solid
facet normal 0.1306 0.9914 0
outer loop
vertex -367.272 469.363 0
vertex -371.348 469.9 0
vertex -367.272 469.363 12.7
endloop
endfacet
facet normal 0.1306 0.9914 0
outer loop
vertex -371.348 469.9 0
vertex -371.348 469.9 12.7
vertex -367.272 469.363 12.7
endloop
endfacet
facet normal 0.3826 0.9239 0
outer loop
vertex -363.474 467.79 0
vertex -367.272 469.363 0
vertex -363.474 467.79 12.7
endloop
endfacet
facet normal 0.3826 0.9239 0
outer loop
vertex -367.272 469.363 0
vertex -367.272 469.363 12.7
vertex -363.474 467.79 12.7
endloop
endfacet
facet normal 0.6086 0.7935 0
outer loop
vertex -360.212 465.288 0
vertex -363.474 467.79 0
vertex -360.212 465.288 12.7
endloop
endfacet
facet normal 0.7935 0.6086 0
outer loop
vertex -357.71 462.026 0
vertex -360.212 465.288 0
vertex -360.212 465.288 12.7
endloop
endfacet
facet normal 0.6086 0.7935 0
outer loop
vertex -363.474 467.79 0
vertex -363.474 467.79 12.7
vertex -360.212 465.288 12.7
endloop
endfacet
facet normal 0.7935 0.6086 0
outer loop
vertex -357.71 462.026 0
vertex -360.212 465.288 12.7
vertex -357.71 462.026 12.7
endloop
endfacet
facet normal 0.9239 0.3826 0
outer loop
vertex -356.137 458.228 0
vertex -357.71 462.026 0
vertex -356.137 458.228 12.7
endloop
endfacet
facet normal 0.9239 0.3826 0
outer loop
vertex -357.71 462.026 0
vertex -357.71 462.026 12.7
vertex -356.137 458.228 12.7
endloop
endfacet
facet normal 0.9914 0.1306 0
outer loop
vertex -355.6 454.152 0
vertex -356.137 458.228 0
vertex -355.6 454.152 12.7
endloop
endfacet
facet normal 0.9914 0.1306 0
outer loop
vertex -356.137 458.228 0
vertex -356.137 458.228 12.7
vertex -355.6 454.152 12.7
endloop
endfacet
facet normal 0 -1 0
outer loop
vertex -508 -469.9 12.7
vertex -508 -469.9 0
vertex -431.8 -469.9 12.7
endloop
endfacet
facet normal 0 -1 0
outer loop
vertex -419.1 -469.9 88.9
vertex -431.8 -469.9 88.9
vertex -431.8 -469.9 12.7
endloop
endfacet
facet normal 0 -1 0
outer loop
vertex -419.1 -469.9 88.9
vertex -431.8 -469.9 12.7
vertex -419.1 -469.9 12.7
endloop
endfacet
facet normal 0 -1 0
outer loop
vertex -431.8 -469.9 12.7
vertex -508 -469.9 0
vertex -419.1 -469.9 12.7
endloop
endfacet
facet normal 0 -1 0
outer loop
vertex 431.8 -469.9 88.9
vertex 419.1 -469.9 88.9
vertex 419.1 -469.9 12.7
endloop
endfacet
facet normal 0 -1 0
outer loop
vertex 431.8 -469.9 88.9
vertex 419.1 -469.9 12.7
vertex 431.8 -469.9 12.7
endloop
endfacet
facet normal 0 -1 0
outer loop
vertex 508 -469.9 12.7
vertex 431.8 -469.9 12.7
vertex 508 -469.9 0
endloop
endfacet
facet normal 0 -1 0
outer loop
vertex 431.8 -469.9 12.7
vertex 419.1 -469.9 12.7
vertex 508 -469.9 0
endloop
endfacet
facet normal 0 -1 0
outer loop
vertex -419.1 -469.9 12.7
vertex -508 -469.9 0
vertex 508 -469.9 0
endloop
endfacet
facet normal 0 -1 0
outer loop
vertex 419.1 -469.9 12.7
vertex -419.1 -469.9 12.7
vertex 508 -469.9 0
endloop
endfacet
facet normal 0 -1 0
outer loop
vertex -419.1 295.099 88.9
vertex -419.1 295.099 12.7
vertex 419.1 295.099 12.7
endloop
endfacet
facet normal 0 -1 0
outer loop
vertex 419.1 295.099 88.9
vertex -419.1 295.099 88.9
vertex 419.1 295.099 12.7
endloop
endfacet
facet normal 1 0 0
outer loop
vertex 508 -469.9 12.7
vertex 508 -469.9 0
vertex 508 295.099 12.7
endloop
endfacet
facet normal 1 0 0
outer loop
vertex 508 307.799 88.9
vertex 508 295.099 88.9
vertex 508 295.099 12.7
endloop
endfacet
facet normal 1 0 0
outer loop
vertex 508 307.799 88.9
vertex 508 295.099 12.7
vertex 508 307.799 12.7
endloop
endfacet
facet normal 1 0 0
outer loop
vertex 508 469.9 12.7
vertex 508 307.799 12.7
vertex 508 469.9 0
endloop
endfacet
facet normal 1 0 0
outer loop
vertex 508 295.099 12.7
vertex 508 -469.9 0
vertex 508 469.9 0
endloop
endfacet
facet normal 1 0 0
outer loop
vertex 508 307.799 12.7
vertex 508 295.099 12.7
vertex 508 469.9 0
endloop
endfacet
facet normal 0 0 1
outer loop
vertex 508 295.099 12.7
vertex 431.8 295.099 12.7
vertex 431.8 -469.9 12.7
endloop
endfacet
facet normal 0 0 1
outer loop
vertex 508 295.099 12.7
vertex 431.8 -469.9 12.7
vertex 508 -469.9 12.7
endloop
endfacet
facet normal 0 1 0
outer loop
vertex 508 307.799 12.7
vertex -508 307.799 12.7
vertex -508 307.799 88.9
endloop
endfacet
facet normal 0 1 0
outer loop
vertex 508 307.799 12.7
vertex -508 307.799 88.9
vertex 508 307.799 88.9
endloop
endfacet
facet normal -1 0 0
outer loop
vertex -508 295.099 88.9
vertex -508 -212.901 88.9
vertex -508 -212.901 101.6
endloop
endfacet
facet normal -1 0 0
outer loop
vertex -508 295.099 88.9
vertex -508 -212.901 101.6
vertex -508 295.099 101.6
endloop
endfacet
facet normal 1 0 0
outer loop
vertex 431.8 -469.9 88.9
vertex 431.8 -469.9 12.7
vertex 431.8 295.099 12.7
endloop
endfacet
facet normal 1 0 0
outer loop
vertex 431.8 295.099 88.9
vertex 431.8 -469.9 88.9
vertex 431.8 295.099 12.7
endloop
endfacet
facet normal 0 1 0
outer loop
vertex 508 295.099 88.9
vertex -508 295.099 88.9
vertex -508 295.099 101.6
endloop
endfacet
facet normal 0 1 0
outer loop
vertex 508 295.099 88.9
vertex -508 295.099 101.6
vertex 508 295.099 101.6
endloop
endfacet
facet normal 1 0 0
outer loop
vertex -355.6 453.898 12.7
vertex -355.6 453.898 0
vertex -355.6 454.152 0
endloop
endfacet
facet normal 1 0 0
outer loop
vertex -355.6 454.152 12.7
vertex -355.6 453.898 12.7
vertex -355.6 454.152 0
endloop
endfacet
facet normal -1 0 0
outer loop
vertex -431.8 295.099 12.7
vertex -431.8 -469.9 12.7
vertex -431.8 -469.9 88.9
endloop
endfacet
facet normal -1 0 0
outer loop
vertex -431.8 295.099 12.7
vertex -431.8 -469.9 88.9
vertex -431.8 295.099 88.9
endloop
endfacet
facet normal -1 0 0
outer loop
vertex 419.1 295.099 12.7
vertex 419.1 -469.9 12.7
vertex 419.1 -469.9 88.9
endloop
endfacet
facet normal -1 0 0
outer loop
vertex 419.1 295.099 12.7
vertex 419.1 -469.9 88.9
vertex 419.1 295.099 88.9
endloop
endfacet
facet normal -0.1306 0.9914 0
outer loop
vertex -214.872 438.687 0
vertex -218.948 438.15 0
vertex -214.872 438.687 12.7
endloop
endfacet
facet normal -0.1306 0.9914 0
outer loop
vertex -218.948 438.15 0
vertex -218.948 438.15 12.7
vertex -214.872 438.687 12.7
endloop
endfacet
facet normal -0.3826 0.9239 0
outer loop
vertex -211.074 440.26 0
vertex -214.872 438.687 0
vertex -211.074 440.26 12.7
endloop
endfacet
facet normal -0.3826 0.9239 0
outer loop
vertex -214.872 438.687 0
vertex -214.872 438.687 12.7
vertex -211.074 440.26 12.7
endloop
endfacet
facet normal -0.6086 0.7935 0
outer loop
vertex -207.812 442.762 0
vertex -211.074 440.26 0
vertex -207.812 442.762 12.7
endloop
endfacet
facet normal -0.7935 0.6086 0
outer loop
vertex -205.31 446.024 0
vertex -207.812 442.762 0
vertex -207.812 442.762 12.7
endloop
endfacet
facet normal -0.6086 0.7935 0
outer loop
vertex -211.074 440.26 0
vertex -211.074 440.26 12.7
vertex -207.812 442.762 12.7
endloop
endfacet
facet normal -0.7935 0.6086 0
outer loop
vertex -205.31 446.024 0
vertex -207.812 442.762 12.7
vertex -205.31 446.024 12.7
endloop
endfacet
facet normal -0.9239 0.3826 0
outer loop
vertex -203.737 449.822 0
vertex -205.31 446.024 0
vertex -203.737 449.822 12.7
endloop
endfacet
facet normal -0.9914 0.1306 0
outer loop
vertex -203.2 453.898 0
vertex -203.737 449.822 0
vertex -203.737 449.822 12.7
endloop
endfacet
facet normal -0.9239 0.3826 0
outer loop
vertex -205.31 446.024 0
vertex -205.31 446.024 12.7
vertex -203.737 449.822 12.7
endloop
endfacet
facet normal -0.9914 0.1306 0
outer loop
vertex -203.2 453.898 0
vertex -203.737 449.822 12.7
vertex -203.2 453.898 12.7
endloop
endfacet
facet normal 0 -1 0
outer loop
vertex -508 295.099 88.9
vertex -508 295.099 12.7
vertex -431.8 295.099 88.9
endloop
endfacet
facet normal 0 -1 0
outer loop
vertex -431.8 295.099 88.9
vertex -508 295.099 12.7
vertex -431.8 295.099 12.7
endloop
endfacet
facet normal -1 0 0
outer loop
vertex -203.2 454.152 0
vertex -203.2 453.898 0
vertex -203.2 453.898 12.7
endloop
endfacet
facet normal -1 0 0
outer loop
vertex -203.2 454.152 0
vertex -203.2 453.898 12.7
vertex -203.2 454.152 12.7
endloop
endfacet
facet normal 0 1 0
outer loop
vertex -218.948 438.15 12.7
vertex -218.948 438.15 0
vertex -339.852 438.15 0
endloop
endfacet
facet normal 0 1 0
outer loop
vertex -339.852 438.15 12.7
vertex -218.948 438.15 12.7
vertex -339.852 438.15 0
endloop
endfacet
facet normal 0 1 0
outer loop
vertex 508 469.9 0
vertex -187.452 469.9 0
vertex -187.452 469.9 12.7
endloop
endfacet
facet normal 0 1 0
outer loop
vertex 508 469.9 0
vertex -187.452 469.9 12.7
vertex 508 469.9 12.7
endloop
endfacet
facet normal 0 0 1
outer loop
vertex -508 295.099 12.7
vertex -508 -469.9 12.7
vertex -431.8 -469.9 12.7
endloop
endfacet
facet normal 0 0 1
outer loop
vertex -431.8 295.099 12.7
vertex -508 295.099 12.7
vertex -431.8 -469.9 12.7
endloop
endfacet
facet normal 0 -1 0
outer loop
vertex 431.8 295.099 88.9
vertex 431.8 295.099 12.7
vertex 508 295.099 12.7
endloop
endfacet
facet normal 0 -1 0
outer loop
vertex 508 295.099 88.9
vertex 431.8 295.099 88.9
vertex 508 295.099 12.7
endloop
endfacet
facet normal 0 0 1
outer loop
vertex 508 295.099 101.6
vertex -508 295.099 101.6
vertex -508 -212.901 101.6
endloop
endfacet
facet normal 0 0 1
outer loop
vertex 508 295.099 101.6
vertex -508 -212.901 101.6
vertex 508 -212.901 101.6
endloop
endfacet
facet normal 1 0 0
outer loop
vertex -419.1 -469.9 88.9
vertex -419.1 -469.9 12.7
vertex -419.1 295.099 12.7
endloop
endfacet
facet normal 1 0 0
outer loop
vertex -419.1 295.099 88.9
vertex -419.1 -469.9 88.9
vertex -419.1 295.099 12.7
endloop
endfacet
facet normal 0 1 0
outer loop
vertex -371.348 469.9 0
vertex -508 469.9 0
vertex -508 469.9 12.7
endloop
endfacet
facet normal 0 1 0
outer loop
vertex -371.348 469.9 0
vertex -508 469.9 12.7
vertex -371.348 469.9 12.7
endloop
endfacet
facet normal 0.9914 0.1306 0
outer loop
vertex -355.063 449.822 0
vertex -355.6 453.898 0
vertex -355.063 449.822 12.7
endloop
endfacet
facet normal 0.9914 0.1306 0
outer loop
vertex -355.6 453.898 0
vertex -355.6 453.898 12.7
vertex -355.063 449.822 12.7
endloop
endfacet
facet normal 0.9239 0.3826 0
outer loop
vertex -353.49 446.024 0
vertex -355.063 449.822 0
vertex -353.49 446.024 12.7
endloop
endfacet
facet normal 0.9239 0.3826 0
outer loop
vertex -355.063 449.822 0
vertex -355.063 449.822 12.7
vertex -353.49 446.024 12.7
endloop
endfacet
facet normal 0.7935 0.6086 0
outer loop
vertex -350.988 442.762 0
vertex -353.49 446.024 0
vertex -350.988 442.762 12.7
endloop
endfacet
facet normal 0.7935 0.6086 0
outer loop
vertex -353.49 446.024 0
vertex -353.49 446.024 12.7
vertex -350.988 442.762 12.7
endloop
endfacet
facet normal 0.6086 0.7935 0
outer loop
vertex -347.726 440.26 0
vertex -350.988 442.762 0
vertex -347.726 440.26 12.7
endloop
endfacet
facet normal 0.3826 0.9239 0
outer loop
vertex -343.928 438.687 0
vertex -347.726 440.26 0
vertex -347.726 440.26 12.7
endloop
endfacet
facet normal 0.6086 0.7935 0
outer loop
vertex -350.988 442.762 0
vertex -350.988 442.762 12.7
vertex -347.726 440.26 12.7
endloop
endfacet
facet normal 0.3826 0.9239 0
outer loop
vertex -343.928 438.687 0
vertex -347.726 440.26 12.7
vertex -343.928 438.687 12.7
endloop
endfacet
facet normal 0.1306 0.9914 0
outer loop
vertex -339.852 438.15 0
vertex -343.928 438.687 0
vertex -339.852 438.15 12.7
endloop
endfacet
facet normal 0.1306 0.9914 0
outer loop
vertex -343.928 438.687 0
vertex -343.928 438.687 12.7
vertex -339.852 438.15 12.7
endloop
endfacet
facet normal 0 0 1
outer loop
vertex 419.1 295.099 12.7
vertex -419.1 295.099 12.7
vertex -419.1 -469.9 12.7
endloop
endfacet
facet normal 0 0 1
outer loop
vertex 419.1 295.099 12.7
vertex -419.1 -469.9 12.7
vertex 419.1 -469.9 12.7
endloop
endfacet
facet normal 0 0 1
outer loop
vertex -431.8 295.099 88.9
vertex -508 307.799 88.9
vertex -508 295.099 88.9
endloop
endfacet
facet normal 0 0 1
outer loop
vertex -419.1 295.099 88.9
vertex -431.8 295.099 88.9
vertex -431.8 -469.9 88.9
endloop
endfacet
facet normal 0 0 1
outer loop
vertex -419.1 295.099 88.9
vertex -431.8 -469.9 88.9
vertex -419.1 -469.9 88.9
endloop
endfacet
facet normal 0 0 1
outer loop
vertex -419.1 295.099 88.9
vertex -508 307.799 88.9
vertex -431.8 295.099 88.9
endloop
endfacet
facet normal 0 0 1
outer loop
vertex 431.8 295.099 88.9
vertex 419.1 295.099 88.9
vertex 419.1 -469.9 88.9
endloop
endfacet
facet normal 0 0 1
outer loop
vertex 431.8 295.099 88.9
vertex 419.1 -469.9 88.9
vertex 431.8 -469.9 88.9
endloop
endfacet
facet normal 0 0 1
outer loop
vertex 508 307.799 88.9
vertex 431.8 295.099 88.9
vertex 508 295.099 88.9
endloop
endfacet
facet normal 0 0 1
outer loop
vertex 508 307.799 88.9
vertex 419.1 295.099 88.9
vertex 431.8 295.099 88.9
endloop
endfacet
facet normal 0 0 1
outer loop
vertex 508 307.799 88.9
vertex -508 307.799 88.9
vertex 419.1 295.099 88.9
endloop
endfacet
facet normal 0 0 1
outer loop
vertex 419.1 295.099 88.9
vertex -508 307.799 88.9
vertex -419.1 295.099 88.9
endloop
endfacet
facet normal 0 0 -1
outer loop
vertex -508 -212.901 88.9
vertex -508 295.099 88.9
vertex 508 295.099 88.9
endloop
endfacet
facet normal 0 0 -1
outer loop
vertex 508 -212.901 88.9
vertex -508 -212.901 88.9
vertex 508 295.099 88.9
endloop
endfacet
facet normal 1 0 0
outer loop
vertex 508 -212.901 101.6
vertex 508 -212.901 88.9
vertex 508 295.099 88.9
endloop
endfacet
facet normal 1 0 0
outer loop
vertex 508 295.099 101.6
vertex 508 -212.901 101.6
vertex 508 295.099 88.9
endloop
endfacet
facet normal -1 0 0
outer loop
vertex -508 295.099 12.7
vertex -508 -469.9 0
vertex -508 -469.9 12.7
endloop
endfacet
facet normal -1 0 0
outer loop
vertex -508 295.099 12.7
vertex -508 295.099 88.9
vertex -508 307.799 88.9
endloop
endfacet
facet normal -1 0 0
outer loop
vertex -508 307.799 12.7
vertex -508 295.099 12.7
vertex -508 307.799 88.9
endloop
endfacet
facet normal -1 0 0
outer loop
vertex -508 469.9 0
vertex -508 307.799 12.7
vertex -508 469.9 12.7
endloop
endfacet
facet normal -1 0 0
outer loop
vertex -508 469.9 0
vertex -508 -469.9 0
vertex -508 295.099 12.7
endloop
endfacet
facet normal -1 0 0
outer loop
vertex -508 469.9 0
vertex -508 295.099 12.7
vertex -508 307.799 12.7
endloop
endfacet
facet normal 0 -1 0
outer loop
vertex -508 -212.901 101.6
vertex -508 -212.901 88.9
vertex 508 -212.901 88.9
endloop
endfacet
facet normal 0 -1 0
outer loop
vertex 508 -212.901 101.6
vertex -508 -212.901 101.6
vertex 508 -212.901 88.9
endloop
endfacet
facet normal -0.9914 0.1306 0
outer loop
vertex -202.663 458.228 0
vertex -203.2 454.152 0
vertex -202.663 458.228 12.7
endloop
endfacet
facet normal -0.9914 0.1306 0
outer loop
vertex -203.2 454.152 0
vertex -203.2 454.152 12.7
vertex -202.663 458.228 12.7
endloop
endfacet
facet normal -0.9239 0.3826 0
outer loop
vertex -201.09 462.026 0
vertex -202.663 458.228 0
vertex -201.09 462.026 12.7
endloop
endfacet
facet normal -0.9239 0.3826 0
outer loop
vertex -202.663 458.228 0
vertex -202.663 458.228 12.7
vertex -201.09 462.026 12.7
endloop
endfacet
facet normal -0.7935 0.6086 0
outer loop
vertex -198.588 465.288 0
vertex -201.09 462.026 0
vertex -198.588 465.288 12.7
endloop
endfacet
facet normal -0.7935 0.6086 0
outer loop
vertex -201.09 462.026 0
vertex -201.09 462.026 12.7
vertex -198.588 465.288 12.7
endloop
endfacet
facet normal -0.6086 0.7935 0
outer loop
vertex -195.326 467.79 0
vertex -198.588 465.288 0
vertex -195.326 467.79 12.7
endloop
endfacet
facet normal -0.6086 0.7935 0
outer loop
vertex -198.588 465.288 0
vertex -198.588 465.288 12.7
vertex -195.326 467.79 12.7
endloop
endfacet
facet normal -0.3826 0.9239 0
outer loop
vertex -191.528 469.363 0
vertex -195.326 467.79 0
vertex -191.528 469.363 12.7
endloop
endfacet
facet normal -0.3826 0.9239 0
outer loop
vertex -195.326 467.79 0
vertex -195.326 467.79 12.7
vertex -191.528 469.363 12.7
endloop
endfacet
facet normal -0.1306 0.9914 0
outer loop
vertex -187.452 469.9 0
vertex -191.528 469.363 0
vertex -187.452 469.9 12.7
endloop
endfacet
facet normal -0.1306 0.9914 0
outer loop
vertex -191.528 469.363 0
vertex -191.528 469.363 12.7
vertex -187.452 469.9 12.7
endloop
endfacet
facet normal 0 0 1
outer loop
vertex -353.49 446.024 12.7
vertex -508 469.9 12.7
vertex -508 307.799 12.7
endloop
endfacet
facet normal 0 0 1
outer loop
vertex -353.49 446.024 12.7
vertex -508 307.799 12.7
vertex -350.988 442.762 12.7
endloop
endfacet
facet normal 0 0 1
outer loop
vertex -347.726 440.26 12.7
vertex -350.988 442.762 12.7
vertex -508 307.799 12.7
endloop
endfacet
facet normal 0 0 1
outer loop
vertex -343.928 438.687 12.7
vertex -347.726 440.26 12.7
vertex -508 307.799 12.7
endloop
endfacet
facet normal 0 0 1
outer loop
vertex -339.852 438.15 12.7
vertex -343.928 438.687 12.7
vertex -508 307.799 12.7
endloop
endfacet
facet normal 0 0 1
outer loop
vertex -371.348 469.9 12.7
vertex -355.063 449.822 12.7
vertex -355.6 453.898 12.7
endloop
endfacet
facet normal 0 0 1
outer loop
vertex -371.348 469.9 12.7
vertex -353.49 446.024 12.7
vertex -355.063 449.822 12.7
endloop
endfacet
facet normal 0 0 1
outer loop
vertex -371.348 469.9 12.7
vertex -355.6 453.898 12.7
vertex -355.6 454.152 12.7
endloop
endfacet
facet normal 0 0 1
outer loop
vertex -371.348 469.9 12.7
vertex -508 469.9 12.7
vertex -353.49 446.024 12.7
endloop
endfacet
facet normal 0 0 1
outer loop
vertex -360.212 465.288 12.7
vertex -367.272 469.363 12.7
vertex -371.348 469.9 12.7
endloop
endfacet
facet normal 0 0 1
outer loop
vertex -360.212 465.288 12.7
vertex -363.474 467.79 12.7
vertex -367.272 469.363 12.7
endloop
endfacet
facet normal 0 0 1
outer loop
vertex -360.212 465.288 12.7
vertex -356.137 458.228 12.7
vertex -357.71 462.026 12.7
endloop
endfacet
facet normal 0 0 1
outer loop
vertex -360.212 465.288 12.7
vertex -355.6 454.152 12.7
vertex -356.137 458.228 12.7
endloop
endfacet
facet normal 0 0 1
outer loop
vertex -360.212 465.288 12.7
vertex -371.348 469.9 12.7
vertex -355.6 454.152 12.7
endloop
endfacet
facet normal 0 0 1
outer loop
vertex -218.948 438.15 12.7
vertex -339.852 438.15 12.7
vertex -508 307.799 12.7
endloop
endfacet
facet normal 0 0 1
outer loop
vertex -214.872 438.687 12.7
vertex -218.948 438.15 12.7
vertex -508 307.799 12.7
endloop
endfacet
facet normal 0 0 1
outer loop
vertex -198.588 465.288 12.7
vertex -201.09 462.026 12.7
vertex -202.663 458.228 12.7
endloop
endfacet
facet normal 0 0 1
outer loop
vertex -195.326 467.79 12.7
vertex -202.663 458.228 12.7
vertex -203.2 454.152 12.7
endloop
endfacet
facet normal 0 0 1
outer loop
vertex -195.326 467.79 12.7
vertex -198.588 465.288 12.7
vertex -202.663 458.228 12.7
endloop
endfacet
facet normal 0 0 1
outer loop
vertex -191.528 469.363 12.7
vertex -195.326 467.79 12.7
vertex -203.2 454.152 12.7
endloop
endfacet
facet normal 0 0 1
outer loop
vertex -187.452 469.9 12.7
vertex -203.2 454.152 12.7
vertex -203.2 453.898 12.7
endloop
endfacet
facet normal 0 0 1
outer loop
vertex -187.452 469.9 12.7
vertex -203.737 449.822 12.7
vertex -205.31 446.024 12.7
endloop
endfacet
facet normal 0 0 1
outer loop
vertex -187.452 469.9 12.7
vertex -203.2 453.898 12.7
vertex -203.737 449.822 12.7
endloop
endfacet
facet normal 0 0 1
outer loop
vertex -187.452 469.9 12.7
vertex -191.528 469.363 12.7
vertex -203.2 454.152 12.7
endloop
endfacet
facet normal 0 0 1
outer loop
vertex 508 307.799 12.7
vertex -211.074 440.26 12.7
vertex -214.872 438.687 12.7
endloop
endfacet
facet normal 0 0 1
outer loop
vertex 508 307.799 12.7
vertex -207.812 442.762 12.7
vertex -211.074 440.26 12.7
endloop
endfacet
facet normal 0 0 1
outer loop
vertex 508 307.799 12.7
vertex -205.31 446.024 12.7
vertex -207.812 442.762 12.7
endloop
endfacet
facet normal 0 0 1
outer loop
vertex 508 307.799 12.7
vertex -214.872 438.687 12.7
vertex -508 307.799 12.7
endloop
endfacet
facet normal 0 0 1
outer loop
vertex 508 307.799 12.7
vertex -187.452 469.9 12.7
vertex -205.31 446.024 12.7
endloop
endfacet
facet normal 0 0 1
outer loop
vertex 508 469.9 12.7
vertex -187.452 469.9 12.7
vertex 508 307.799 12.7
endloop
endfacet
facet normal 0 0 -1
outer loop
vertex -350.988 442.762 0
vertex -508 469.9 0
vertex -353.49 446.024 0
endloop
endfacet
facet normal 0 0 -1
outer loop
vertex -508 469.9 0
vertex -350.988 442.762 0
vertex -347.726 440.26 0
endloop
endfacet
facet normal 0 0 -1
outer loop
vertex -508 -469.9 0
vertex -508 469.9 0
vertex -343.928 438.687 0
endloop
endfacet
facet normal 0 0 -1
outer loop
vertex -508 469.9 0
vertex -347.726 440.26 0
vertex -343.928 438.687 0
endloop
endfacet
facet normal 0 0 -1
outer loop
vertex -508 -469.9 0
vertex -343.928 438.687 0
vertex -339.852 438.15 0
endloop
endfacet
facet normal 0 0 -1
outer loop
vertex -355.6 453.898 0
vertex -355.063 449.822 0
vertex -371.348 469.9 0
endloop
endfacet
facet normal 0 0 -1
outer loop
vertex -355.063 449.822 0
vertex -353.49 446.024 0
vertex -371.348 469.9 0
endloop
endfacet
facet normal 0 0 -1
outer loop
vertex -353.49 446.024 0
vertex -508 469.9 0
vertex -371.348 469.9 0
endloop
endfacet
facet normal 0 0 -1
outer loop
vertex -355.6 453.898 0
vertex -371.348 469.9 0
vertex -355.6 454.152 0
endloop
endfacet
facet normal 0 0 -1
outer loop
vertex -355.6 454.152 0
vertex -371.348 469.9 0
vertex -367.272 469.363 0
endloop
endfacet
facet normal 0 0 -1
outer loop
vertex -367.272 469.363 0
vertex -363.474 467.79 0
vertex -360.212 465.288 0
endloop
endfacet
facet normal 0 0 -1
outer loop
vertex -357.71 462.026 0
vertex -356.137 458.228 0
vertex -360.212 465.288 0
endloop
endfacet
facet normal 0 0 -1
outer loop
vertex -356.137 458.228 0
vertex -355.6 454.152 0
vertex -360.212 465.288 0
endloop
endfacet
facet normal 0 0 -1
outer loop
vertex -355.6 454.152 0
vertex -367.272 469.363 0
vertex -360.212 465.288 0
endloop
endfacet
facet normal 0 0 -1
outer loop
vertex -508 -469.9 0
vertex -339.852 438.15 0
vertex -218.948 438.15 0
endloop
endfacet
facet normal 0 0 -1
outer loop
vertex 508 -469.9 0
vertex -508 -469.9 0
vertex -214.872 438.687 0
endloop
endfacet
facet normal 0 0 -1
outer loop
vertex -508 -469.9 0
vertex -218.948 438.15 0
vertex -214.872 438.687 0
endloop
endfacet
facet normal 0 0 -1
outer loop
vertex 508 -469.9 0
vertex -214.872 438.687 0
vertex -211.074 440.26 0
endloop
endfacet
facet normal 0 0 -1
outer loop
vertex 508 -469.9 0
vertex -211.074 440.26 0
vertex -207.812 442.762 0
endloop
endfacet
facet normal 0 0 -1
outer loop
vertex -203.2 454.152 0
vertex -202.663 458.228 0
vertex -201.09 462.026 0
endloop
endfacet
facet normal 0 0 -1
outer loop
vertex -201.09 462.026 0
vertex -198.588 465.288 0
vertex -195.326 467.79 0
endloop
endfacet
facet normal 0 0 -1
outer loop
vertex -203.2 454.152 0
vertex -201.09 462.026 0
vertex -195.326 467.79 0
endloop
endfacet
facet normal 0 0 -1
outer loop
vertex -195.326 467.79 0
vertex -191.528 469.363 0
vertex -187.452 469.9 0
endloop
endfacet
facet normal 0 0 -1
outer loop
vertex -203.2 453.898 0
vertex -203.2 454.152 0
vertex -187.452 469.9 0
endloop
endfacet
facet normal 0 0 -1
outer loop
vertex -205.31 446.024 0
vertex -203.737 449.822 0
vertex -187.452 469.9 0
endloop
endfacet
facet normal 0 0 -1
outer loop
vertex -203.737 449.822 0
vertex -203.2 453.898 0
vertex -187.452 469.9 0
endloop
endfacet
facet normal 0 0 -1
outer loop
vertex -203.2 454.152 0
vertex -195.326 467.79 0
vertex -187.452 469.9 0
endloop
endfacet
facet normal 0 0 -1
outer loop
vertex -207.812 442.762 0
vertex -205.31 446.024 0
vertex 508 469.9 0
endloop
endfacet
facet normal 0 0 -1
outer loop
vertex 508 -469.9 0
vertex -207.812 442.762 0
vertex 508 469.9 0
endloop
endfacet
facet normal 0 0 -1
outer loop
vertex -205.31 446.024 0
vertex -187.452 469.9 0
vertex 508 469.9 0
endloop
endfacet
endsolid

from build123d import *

# Parameters (mm, degrees)
SKETCH1_W           = 1016
SKETCH1_H           = 939.8
BOSS_EXTRUDE1_DEPTH = 12.7
SKETCH2_W           = 152.4
SKETCH2_H           = 31.75
CUT_EXTRUDE1_DEPTH  = 693.120870947
FILLET1_R           = 15.748
SKETCH4_W           = 1016
SKETCH4_H           = 12.7
BOSS_EXTRUDE2_DEPTH = 76.2
SKETCH5_W           = 12.7
SKETCH5_H           = 764.99923202
BOSS_EXTRUDE3_DEPTH = 76.2
SKETCH8_W           = 1016
SKETCH8_H           = 508
BOSS_EXTRUDE5_DEPTH = 12.7


with BuildPart() as part:
    # Sketch1 → Boss-Extrude1 (new body)
    with BuildSketch(Plane.XY):
        Rectangle(SKETCH1_W, SKETCH1_H)
    extrude(amount=BOSS_EXTRUDE1_DEPTH)

    # Sketch2 → Cut-Extrude1 (cut, through all)
    with BuildSketch(Plane(origin=(0, 0, 0), x_dir=(-1, 0, 0), z_dir=(0, 0, -1))):
        with Locations((279.4, 454.025)):
            Rectangle(SKETCH2_W, SKETCH2_H)
    extrude(amount=-CUT_EXTRUDE1_DEPTH, mode=Mode.SUBTRACT)

    # Fillet1
    fillet1_edges = [part.edges().sort_by_distance(p)[0] for p in [
        (-355.6, 469.9, 6.35),
        (-355.6, 438.15, 6.35),
        (-203.2, 438.15, 6.35),
        (-203.2, 469.9, 6.35),
    ]]
    fillet(fillet1_edges, radius=FILLET1_R)

    # Sketch4 → Boss-Extrude2 (add)
    with BuildSketch(Plane.XY.offset(12.7)):
        with Locations((0, 301.44923202)):
            Rectangle(SKETCH4_W, SKETCH4_H)
    extrude(amount=BOSS_EXTRUDE2_DEPTH)

    # Sketch5 → Boss-Extrude3 (add)
    with BuildSketch(Plane.XY.offset(12.7)):
        with Locations((-425.45, -87.40038399)):
            Rectangle(SKETCH5_W, SKETCH5_H)
        with Locations((425.45, -87.40038399)):
            Rectangle(SKETCH5_W, SKETCH5_H)
    extrude(amount=BOSS_EXTRUDE3_DEPTH)


with BuildPart() as body_2:
    # Sketch8 → Boss-Extrude5 (new body)
    with BuildSketch(Plane.XY.offset(88.9)):
        with Locations((0, 41.09923202)):
            Rectangle(SKETCH8_W, SKETCH8_H)
    extrude(amount=BOSS_EXTRUDE5_DEPTH)


solid = Compound([part.part, body_2.part])
